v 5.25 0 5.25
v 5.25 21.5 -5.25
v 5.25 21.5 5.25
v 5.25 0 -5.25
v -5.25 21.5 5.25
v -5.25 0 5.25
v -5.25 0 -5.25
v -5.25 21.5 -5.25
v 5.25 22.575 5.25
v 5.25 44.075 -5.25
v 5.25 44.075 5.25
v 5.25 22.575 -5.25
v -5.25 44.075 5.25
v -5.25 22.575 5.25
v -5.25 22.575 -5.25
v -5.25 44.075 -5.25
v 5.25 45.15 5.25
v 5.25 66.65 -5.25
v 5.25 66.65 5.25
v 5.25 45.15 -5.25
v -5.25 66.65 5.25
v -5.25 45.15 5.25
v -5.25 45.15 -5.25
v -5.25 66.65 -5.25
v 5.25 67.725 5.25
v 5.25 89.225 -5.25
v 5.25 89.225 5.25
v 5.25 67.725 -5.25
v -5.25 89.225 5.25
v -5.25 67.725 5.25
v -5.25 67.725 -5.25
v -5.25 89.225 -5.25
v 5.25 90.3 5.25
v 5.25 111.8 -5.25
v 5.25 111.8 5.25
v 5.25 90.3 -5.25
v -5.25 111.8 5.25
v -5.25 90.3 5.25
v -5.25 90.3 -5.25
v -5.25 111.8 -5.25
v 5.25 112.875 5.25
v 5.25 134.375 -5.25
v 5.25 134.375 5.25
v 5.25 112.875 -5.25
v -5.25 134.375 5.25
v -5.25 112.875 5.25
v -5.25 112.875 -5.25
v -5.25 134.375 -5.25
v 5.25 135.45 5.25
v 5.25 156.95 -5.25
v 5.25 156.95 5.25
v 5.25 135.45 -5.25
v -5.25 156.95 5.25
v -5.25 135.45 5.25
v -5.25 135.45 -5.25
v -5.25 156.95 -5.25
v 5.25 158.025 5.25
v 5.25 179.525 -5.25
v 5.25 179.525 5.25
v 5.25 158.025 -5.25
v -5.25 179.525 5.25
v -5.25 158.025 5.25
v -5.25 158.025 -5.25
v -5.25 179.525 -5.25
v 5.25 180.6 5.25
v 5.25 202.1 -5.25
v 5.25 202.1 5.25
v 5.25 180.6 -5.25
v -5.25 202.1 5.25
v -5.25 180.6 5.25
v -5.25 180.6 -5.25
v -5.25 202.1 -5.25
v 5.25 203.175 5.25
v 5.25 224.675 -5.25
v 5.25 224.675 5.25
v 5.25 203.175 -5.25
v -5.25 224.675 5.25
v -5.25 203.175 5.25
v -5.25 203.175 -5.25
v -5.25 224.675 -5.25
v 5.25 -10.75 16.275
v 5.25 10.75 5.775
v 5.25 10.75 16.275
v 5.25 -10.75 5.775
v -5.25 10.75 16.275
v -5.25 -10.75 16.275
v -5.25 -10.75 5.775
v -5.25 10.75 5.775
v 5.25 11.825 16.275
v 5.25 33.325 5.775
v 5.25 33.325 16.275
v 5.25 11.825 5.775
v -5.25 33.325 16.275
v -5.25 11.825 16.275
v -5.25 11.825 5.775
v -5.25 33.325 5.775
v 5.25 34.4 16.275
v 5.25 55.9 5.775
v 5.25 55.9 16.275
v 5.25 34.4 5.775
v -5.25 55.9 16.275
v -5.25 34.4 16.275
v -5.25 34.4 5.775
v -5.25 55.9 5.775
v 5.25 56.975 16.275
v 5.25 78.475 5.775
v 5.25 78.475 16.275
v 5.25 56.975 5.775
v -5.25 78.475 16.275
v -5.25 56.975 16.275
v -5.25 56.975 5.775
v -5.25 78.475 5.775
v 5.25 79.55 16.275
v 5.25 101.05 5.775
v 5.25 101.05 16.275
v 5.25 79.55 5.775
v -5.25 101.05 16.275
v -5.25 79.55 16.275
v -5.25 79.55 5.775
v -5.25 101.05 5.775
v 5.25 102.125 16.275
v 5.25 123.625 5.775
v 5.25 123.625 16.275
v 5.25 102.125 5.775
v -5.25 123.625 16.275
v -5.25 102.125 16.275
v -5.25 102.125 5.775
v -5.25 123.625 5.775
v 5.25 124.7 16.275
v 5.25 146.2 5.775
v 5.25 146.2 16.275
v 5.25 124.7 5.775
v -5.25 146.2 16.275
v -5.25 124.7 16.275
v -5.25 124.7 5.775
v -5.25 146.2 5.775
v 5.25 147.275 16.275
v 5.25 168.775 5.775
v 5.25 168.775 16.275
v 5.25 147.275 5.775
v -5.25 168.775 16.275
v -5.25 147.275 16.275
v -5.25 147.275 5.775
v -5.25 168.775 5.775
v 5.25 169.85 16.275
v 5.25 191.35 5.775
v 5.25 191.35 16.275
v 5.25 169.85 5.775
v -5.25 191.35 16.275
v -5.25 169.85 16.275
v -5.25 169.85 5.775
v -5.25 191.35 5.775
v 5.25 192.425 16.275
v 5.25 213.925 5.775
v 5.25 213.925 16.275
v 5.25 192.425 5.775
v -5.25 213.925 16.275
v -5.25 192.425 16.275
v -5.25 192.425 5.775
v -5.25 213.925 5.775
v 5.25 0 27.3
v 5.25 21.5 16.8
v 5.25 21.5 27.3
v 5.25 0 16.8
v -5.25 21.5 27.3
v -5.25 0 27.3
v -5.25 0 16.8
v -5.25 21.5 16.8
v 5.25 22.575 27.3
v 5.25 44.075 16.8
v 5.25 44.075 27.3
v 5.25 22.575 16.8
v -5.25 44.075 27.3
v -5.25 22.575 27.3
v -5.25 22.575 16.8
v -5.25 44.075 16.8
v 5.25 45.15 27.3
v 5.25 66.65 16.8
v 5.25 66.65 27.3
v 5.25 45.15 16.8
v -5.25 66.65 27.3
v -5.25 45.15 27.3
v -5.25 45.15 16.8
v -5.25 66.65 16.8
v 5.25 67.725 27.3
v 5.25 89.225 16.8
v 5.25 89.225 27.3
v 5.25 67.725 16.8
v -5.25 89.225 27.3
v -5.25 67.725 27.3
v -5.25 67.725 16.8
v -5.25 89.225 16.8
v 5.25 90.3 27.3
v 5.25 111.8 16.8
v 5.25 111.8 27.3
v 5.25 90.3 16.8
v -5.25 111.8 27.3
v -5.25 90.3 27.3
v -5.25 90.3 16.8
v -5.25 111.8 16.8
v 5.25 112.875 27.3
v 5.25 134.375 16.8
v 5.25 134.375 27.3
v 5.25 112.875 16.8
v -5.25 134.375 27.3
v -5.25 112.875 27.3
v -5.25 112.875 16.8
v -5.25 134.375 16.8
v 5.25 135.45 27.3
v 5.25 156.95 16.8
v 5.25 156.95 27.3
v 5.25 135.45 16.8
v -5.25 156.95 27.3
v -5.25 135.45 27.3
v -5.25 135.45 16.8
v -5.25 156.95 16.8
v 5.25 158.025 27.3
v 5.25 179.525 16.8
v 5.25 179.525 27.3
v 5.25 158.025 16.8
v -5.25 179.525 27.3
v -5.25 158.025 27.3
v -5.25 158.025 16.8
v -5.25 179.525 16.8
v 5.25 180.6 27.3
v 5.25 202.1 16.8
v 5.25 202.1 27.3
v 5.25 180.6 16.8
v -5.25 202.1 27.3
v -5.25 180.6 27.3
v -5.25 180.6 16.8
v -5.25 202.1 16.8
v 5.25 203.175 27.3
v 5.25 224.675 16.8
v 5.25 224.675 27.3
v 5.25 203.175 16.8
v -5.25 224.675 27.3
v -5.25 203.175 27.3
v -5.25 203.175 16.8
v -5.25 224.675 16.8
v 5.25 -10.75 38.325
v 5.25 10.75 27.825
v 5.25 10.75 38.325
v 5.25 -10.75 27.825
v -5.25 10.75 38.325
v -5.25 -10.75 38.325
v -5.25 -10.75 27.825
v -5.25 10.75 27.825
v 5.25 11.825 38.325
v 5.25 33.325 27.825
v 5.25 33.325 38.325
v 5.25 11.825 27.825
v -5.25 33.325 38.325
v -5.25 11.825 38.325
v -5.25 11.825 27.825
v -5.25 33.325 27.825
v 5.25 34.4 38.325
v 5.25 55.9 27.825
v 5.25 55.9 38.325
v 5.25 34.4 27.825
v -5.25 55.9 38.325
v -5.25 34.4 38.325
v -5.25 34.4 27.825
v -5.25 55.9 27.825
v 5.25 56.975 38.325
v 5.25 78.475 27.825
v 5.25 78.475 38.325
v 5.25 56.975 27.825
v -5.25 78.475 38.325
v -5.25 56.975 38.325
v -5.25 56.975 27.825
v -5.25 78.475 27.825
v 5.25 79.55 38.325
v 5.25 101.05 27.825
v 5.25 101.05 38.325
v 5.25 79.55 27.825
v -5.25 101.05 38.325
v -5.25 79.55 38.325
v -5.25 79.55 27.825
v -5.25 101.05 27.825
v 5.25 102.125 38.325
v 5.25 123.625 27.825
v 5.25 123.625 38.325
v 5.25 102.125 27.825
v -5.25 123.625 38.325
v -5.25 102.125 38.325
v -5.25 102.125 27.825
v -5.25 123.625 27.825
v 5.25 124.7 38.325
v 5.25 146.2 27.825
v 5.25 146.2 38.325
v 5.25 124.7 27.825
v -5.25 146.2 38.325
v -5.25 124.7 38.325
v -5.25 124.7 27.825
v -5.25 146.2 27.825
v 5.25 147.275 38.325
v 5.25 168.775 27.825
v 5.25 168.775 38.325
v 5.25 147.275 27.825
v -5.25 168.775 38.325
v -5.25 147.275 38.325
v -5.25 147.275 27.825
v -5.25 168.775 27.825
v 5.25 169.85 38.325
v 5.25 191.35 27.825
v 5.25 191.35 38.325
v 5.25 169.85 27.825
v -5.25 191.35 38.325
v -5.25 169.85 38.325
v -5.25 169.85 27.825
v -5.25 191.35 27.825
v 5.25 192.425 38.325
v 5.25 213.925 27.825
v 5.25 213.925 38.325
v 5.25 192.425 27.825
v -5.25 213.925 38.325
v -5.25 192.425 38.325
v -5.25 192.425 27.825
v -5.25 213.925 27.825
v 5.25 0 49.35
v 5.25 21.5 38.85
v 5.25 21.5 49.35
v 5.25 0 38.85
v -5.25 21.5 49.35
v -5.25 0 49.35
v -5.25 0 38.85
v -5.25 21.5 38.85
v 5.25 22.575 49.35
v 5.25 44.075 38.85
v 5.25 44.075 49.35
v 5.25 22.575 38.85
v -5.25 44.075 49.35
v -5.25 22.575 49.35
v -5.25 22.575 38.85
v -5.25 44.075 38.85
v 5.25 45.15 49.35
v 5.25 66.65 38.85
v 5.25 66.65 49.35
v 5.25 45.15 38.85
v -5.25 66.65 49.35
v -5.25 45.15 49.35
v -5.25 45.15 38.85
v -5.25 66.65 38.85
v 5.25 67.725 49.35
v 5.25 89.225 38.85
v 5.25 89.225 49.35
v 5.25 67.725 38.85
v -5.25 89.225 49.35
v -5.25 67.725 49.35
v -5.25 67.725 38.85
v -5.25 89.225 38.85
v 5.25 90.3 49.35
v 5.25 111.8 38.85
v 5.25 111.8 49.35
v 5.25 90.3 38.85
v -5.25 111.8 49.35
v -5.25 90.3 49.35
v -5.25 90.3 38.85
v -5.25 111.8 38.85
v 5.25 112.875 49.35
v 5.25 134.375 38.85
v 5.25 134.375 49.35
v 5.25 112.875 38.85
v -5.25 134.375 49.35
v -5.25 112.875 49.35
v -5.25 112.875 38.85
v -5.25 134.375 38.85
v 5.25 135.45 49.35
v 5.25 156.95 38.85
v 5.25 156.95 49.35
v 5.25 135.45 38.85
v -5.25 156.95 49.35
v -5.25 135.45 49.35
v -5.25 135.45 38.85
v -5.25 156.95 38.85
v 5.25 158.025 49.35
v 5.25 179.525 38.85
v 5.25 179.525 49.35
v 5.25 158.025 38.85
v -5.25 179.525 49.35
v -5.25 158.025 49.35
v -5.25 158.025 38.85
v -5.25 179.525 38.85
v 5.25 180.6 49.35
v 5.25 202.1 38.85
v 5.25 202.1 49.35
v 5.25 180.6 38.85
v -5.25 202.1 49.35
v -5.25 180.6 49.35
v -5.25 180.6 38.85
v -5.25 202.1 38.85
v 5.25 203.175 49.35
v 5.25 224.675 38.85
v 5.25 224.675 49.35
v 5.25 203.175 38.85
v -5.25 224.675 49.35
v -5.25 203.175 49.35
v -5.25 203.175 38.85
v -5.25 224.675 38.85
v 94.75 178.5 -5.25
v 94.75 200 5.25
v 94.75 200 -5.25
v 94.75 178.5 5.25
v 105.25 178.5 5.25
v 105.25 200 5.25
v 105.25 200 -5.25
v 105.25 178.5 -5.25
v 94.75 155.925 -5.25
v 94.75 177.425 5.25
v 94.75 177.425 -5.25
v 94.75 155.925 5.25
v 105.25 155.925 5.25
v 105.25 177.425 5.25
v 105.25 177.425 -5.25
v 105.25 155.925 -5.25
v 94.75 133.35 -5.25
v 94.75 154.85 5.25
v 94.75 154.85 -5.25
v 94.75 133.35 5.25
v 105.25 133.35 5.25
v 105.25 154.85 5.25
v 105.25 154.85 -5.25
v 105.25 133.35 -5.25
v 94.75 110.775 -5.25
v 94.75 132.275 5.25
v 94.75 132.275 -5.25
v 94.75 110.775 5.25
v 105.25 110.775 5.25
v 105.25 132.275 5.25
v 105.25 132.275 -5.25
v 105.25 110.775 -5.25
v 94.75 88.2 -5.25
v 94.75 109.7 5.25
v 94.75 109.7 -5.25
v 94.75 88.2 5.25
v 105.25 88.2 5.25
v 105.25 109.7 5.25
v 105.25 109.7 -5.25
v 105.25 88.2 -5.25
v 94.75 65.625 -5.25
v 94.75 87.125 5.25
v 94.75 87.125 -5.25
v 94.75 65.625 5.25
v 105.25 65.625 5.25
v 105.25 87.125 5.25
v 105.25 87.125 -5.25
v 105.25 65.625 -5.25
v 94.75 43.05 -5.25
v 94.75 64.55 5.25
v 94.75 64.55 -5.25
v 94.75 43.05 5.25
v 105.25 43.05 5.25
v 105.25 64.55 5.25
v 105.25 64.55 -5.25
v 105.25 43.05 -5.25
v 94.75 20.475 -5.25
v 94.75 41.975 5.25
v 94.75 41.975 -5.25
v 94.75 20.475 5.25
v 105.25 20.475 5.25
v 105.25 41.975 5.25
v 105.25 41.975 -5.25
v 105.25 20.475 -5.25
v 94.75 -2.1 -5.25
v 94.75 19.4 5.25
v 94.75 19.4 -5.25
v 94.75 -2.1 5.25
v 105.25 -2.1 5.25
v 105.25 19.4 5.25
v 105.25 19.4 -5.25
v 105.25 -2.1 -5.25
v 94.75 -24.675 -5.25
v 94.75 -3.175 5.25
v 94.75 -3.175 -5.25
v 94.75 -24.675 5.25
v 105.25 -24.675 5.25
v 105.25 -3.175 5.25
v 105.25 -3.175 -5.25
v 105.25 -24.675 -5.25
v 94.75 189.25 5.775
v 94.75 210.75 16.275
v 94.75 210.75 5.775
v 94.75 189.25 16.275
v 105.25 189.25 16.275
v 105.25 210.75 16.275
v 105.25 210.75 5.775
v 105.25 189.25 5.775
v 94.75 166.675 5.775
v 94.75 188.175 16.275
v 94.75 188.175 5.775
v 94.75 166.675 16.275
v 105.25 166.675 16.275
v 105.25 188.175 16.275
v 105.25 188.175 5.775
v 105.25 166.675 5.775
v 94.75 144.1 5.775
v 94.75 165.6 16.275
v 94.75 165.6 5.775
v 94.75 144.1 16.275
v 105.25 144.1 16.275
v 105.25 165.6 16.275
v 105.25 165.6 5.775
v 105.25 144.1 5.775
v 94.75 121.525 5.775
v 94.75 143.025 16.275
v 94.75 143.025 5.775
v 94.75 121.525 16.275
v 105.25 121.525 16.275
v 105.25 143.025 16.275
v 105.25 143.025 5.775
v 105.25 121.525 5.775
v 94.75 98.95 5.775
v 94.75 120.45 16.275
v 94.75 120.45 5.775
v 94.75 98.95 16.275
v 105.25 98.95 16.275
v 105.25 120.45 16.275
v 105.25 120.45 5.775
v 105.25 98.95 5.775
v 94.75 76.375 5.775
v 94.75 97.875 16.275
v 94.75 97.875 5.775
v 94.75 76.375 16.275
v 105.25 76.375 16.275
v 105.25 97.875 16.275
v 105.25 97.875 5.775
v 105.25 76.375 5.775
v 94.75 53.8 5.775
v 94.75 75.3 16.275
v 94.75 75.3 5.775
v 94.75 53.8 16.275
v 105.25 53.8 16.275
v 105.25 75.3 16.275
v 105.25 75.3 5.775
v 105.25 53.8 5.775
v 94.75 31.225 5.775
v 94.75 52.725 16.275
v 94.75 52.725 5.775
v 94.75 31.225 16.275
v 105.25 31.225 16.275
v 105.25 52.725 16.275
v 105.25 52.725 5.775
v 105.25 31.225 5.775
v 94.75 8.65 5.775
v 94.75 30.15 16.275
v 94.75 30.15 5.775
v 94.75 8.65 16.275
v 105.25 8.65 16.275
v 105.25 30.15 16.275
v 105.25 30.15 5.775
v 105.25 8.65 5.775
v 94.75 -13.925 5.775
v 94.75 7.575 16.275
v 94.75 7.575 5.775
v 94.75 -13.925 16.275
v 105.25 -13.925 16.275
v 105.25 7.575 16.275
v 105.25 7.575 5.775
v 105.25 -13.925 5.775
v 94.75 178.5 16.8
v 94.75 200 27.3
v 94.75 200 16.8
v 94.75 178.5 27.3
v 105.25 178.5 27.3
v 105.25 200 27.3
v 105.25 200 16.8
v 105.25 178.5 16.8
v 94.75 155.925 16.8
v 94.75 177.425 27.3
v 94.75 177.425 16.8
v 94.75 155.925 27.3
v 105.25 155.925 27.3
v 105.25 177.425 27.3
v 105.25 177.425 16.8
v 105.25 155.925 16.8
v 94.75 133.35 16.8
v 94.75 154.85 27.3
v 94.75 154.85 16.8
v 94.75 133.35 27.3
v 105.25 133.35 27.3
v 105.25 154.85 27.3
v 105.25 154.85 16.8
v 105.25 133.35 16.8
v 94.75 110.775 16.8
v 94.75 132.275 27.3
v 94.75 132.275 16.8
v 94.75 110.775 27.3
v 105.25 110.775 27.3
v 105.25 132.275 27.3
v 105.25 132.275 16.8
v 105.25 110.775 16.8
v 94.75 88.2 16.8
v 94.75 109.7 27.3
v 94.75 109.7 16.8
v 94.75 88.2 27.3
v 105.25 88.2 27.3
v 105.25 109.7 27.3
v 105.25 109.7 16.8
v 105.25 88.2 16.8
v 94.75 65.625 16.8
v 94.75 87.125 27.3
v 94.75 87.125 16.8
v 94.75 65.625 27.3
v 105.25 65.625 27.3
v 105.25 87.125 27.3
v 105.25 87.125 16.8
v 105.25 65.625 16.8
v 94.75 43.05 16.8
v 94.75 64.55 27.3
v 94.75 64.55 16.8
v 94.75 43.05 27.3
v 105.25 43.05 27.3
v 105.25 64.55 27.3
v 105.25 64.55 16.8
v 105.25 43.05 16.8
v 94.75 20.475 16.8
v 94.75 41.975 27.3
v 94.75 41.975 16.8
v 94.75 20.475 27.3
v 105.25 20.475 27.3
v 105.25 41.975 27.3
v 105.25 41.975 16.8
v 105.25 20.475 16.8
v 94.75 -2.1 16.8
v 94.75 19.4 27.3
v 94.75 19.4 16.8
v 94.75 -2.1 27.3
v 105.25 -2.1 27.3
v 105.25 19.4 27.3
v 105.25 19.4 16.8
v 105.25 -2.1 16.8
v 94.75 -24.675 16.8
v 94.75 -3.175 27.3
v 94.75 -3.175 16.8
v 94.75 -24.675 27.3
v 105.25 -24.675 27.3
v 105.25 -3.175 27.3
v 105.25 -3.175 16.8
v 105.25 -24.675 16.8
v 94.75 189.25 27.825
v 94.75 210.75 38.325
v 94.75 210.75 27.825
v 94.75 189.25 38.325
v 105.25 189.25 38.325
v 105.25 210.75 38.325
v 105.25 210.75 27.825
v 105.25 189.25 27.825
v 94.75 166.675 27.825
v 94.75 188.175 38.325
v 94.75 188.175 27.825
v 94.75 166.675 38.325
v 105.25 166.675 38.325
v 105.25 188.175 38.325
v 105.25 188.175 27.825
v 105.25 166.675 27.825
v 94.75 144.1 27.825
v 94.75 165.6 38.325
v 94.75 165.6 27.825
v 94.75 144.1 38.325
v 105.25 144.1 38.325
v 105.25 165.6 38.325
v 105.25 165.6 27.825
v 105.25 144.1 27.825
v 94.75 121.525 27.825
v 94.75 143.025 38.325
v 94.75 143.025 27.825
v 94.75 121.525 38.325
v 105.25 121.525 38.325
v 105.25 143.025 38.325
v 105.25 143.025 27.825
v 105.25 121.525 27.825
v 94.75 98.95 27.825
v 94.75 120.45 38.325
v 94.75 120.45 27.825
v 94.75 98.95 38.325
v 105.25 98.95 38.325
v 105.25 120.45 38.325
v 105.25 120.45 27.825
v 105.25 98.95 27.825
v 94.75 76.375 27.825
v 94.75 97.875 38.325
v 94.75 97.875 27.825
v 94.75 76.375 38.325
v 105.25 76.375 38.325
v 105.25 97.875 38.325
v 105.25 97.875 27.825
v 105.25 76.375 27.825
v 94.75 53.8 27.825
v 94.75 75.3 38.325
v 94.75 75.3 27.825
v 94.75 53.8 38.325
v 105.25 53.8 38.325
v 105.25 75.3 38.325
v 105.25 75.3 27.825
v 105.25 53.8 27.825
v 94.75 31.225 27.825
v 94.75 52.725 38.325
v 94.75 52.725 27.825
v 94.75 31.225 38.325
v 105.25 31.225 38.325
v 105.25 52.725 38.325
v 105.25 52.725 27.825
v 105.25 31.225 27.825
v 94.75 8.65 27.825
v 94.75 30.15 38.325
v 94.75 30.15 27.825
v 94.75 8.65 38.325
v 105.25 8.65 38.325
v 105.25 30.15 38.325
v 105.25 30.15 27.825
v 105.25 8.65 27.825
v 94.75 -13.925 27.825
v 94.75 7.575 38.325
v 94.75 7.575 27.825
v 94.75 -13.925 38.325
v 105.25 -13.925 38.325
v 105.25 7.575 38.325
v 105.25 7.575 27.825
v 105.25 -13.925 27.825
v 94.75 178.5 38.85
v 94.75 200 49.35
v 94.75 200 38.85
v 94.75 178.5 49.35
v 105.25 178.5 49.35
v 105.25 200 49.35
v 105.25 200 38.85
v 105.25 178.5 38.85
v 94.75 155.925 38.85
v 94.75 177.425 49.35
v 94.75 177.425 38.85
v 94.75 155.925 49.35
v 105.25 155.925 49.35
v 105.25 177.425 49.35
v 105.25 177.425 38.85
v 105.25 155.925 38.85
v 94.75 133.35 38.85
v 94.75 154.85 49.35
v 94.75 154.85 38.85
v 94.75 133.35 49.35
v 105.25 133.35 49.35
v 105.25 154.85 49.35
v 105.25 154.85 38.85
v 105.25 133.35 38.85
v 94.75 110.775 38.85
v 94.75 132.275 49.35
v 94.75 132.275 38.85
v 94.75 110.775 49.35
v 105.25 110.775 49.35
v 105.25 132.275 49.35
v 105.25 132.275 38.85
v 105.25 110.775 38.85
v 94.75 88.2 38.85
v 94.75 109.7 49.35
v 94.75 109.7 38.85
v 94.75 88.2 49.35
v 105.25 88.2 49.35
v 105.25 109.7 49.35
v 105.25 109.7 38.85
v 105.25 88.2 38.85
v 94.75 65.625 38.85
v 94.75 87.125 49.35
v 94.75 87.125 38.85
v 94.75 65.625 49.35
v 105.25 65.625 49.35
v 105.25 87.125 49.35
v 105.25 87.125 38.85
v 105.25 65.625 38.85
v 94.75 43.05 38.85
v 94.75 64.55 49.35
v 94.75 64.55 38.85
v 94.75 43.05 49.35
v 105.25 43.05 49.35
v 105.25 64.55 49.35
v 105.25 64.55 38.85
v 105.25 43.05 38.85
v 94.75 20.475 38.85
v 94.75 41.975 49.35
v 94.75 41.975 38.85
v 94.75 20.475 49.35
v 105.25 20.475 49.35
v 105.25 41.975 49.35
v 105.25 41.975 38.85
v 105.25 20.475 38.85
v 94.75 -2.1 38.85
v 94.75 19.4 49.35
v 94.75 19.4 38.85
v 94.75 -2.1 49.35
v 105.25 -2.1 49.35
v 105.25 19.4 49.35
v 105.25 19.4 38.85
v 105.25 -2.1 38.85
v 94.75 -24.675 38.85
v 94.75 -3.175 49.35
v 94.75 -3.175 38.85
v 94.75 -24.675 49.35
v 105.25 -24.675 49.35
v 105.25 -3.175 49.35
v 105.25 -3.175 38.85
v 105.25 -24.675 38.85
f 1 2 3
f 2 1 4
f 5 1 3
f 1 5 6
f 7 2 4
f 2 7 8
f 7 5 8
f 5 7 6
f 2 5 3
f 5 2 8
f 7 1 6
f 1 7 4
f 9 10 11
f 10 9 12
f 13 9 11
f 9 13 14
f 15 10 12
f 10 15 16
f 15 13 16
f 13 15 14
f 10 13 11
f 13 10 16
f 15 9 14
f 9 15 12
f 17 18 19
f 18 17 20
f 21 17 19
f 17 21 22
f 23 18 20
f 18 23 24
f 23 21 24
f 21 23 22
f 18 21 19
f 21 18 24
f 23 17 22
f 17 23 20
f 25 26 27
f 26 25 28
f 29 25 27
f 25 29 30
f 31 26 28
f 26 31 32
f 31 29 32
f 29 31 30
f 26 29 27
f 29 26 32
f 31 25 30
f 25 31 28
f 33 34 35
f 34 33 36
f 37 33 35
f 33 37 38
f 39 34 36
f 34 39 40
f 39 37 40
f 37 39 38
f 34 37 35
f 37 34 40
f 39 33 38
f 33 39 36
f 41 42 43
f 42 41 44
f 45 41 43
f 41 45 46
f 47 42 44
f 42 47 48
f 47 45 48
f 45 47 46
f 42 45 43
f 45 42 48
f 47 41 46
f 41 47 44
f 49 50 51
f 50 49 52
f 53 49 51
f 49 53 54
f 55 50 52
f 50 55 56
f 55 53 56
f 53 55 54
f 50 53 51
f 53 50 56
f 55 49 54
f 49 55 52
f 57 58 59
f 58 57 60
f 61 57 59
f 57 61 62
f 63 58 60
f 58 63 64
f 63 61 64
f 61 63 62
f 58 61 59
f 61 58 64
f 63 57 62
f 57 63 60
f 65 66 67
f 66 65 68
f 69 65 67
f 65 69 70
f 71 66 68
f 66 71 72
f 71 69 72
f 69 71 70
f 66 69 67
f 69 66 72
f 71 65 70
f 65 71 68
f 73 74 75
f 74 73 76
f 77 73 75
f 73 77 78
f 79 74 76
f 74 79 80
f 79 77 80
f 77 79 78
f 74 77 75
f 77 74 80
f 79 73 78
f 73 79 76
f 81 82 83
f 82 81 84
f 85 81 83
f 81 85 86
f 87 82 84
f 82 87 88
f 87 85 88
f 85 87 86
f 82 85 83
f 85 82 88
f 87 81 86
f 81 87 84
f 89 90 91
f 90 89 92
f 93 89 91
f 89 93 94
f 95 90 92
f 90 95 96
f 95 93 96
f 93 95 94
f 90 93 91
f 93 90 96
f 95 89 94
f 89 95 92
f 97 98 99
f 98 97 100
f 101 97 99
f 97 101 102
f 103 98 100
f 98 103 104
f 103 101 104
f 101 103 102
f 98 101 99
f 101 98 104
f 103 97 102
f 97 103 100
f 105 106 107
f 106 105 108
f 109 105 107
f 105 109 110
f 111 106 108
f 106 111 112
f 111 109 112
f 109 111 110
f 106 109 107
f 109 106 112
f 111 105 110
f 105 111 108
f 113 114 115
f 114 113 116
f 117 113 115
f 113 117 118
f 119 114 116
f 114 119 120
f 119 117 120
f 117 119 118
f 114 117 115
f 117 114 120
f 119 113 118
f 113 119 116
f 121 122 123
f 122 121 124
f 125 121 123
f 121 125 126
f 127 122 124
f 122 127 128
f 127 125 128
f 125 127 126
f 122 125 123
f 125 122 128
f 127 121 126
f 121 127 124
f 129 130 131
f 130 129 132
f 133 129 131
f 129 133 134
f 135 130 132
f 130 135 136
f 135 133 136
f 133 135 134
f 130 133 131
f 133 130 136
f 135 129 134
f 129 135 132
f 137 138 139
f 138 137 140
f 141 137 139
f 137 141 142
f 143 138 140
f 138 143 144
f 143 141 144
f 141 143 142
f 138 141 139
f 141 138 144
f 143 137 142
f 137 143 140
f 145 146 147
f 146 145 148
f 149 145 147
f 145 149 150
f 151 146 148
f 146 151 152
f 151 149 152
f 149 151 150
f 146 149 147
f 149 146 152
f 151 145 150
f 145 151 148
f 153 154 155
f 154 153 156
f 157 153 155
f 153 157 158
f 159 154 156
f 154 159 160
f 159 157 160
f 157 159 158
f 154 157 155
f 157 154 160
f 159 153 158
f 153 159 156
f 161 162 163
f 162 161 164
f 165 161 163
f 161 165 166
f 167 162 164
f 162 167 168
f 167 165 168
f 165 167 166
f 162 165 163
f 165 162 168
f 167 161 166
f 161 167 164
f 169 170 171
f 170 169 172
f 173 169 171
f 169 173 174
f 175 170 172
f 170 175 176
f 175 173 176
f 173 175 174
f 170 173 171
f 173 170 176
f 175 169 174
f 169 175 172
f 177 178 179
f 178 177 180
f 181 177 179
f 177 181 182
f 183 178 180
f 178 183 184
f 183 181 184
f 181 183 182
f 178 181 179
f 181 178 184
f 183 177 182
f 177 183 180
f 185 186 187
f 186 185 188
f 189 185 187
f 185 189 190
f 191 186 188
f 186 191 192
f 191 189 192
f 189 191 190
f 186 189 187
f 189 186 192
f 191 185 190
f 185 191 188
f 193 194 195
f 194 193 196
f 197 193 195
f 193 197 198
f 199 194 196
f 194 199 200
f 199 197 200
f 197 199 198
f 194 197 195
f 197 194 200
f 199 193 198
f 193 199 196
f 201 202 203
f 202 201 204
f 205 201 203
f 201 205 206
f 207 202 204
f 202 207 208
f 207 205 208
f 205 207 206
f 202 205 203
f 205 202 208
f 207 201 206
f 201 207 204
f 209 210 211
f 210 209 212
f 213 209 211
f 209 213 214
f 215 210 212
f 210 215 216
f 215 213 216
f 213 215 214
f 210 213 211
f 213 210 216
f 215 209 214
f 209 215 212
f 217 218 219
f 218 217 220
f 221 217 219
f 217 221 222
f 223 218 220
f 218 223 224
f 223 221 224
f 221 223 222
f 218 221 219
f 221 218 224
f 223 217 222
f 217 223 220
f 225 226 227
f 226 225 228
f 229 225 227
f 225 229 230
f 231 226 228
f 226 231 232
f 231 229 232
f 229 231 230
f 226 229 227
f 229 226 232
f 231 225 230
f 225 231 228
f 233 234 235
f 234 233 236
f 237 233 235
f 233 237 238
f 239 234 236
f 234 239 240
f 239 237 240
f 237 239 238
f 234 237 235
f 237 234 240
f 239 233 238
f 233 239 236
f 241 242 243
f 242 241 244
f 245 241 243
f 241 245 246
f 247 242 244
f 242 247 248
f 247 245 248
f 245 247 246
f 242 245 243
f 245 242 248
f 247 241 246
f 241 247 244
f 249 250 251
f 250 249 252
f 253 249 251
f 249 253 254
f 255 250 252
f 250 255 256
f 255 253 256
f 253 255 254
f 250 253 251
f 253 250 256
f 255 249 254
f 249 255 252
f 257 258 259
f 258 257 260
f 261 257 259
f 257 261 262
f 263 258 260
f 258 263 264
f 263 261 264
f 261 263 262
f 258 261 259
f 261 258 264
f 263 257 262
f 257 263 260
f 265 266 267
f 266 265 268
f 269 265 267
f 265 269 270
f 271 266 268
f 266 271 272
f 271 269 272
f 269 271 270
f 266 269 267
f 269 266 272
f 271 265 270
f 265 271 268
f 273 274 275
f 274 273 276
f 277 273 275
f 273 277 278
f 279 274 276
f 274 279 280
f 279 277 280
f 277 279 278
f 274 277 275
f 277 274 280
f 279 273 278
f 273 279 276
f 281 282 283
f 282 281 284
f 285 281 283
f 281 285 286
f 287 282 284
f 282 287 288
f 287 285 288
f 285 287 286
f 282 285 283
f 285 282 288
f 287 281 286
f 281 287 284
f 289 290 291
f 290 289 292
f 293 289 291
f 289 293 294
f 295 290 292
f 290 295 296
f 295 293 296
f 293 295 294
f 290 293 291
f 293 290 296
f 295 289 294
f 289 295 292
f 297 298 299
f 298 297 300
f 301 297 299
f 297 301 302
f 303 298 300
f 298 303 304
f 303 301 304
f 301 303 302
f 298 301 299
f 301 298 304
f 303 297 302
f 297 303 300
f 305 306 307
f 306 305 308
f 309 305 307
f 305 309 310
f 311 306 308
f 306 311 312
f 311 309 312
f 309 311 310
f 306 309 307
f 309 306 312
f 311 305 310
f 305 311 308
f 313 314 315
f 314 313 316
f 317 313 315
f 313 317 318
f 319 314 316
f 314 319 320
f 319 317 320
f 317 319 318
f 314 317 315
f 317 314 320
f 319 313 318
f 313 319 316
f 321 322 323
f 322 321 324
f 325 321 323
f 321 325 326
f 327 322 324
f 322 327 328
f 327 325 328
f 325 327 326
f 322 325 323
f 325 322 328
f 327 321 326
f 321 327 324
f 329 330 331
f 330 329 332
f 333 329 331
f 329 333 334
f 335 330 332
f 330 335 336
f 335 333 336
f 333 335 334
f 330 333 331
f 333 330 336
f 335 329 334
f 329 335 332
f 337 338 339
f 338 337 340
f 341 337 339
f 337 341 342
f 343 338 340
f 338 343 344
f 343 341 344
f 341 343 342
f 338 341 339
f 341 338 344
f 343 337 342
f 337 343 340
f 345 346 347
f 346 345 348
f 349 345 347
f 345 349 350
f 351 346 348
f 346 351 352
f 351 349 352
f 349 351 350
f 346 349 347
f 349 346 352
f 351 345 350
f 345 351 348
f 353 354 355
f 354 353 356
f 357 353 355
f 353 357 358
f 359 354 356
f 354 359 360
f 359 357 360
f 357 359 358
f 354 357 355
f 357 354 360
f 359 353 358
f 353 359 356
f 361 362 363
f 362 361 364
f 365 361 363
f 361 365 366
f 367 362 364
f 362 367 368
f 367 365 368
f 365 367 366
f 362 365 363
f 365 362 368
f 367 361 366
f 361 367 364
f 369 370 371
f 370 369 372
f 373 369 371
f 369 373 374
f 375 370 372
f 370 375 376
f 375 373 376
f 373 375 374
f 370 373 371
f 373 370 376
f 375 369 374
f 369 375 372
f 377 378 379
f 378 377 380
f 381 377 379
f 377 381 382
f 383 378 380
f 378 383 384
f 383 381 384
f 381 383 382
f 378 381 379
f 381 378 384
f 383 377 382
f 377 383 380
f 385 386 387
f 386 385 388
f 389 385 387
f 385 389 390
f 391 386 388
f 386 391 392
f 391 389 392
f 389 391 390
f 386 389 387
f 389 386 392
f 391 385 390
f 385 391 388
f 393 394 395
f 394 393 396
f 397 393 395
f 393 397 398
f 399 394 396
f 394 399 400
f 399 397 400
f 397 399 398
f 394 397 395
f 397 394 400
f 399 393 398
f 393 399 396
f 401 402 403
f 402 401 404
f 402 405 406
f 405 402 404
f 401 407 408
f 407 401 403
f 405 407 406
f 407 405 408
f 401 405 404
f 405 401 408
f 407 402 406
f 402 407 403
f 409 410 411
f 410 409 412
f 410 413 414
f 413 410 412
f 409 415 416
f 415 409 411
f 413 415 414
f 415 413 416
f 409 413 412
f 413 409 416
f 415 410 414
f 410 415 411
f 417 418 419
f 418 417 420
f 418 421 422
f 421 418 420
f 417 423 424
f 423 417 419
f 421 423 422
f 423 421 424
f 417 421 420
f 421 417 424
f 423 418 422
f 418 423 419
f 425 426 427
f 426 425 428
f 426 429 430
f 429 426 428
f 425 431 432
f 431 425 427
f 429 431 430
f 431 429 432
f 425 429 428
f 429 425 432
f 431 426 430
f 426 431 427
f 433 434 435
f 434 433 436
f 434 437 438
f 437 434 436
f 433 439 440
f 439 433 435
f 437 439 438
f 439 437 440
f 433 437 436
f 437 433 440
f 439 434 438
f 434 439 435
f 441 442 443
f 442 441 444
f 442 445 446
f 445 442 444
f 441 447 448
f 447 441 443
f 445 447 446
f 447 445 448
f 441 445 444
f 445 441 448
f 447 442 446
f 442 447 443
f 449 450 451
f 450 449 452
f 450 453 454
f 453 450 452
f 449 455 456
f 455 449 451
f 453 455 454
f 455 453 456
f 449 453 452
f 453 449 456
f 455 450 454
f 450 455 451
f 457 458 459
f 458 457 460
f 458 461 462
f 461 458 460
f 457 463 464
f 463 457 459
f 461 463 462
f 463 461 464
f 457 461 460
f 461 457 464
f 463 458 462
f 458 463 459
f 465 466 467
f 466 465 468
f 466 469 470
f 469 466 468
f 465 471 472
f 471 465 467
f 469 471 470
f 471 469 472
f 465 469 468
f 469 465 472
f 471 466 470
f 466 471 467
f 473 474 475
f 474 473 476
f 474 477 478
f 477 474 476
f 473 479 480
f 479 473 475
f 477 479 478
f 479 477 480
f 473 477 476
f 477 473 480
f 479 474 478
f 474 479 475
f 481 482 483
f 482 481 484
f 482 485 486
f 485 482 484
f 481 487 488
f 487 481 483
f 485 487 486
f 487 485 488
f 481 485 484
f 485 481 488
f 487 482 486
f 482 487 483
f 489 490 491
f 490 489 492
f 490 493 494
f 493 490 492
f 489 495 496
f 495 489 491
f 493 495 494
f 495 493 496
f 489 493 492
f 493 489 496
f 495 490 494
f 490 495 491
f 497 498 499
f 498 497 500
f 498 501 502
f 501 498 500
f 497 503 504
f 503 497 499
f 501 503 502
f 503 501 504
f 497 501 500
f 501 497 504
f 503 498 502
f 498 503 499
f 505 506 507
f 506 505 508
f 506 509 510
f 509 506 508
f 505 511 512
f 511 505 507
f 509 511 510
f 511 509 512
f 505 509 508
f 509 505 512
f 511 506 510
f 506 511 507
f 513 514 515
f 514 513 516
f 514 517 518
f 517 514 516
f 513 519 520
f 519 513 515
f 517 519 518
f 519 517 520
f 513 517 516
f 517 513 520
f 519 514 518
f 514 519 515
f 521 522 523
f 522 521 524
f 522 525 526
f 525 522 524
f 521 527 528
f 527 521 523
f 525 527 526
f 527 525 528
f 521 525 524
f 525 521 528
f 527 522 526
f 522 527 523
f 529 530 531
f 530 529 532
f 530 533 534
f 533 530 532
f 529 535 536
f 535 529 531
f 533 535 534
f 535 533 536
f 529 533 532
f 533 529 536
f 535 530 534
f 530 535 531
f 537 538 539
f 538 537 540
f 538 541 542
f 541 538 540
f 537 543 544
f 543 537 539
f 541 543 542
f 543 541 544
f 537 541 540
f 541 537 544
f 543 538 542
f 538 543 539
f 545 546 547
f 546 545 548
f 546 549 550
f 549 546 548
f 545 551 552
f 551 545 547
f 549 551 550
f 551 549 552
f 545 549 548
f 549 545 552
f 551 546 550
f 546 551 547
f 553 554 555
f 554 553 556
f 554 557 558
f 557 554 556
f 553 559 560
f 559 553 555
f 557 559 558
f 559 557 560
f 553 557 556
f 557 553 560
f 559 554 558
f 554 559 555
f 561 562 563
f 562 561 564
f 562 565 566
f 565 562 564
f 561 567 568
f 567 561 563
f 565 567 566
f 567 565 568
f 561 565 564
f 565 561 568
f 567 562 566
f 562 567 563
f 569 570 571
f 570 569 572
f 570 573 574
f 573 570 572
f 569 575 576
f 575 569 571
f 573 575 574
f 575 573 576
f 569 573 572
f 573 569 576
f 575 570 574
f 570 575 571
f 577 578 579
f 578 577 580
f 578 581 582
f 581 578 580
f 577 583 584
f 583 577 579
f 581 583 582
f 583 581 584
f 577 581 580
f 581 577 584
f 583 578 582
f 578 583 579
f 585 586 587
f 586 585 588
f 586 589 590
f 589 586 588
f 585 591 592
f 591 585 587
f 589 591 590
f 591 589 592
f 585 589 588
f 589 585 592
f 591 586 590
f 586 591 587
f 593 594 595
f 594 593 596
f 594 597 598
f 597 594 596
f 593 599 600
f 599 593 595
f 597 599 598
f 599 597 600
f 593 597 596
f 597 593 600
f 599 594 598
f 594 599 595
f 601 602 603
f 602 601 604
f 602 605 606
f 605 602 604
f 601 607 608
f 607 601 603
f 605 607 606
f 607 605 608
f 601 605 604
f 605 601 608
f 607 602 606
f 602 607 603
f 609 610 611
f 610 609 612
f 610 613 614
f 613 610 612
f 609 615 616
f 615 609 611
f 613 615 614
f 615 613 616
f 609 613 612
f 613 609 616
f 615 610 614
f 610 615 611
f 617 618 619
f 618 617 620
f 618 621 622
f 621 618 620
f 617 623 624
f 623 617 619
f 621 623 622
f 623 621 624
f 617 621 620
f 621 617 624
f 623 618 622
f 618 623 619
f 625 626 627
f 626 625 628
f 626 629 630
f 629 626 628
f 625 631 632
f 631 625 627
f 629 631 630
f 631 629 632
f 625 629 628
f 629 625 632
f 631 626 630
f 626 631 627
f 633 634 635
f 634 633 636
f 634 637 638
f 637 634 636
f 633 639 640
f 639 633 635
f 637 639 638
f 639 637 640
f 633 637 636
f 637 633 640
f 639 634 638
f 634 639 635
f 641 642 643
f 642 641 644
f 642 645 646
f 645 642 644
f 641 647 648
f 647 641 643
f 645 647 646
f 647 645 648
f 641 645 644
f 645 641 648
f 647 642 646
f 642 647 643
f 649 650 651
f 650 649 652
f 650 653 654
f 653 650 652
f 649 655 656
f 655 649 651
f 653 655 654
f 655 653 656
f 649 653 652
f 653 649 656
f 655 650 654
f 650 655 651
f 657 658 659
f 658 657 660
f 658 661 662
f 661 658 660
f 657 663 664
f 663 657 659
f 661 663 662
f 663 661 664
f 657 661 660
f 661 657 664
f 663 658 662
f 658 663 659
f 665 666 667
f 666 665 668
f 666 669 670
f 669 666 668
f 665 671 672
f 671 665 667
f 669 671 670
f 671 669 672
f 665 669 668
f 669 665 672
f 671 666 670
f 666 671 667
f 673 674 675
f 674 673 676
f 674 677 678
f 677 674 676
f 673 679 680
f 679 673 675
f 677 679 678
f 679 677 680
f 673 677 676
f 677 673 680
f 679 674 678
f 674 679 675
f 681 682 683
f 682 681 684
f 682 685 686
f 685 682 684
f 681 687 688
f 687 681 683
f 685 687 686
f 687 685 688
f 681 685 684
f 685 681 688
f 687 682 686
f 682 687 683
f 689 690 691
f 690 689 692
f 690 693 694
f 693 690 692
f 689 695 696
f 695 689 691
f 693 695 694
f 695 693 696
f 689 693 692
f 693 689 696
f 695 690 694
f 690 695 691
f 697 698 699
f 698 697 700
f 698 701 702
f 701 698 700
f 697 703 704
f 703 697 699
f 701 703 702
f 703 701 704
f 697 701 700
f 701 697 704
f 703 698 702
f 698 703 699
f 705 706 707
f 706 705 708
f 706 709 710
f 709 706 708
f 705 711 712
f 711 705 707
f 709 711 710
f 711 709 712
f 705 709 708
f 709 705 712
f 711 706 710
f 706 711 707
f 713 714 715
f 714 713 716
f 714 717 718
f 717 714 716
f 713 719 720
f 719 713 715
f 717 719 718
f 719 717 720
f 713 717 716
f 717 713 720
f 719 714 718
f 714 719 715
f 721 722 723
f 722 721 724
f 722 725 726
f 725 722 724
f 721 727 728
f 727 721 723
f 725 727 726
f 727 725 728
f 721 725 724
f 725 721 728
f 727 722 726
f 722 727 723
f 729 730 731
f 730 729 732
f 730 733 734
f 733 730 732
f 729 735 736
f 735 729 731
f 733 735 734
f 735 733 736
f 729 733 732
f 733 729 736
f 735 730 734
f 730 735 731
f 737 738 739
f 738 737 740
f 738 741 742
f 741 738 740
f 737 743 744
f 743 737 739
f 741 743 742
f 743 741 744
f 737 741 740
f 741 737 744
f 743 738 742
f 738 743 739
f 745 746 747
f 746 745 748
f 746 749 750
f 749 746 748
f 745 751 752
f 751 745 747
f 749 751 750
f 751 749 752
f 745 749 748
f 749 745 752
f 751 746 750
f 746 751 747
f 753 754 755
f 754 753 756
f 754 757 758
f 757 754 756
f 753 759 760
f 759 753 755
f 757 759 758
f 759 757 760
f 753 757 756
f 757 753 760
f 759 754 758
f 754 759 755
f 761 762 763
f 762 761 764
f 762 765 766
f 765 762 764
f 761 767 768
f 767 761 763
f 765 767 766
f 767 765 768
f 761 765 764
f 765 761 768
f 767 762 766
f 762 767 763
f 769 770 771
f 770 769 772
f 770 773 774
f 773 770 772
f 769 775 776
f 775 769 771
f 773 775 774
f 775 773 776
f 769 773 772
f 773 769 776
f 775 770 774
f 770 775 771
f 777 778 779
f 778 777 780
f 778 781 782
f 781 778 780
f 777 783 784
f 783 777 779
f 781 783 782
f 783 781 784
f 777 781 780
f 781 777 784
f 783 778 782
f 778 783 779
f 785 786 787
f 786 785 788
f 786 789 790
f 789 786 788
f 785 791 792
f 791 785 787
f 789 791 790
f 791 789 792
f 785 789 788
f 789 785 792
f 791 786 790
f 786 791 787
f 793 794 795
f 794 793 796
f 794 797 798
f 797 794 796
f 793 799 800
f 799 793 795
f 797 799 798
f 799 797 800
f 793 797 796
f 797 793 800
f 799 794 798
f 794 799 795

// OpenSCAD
/*This is just a very basic model that generates the brick reservoir based on the size of the digester*/

/*Digester Size*/
dl=200;//length
dw=100;//width
dh=50;


/*Brick Parameters*/
h=10.5;//height
w=10.5;//width
l=21.5;//length

i_end=dl/l;
z_end=dw/l;
y_end=dh/h;



//brick line
module l_line(dist){
for (i=[0:i_end])
translate([0,i*(dist+dist*0.05),0])
 cube(size=[w,l,h], center=true);
}

module w_line(dist){
for (i=[0:z_end])
rotate(-90,30,0)
translate([0,i*(dist+dist*0.05),0])
 cube(size=[w,l,h], center=true);
}



// Create wall with proper positioning of bricks
module l_wall(){
    for (i=[0:y_end])
        if (i%2==0){
        translate([0,l/2,i*(h+(h*0.05))])
        l_line(l);
        }
    else{
        translate([0,0,i*(h+(h*0.05))])
        l_line(l);
        }
}

//w_line(l);




l_wall();
//mirror([0,1,0])l_wall();

rotate([0,0,180])
color("lime")
translate([-dw,-dl,0])
l_wall();

//translate([0,0,0])color("red")w_wall();
